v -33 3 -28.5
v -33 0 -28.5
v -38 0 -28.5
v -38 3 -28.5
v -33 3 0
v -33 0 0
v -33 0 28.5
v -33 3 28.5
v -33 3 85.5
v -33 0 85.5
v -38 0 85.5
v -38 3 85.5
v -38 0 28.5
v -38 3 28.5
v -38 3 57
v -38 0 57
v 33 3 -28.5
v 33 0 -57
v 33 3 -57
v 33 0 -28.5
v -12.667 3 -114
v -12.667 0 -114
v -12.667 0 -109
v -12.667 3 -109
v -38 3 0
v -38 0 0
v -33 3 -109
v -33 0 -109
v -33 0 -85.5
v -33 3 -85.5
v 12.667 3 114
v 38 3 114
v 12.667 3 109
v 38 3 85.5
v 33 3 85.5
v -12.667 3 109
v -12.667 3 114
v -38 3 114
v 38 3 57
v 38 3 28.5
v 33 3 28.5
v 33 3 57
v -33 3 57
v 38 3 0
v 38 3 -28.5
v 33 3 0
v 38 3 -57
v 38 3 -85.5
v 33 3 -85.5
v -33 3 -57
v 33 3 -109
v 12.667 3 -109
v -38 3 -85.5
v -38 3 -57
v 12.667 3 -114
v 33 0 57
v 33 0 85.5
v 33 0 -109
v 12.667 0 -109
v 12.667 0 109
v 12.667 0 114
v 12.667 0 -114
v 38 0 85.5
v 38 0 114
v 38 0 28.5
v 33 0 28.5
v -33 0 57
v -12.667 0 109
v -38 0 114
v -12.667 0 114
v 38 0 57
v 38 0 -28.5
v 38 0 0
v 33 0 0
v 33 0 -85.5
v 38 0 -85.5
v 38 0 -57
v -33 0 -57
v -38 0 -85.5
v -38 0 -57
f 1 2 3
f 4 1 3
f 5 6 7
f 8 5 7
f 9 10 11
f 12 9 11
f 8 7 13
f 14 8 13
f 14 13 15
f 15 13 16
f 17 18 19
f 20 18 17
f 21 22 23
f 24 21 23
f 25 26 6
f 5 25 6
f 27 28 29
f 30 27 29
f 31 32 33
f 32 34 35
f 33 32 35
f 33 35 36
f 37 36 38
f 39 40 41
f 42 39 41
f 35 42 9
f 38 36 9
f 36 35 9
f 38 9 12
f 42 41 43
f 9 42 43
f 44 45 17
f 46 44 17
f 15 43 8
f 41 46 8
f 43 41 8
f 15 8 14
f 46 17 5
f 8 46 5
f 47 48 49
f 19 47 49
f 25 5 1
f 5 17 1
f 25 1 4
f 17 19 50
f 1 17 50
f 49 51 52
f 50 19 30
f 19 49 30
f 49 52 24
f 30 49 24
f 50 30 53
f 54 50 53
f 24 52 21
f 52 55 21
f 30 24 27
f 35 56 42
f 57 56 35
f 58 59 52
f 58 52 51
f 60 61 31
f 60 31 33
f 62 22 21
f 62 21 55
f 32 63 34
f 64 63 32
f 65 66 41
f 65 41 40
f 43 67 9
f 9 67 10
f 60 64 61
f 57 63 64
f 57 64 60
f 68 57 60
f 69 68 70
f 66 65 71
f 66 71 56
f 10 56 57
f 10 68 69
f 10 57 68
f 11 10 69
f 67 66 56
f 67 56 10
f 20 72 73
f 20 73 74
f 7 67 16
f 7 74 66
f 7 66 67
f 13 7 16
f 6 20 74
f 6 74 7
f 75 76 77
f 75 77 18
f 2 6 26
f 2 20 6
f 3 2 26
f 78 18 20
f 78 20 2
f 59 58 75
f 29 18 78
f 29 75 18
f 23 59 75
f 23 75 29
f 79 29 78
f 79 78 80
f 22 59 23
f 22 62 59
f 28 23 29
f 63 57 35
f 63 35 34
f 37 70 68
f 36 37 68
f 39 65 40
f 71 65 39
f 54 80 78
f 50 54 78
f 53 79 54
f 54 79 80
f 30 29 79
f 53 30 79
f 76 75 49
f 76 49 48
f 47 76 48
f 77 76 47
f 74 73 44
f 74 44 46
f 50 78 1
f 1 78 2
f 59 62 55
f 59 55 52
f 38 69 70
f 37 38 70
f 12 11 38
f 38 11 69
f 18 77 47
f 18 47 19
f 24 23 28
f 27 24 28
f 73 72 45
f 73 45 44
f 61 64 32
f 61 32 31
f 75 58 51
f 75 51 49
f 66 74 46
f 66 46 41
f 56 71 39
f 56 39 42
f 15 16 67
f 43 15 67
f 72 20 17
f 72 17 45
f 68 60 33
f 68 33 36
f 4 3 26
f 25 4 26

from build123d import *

# Parameters (mm, degrees)
BOSS_EXTRUDE1_DEPTH = 3


with BuildPart() as part:
    # Sketch1 → Boss-Extrude1 (new body)
    with BuildSketch(Plane(origin=(0, 0, 0), x_dir=(1, 0, 0), z_dir=(0, 1, 0))):
        Polygon((-38, -114), (-12.666666667, -114), (-12.666666667, -109), (0, -109), (0, 114), (-12.666666667, 114), (-12.666666667, 109), (-33, 109), (-33, 85.5), (-38, 85.5), (-38, 57), (-33, 57), (-33, 28.5), (-38, 28.5), (-38, 0), (-33, 0), (-33, -28.5), (-38, -28.5), (-38, -57), (-33, -57), (-33, -85.5), (-38, -85.5), align=None)
    boss_extrude1 = extrude(amount=BOSS_EXTRUDE1_DEPTH)

    # Mirror1: Boss-Extrude1 across plane
    add(boss_extrude1.mirror(Plane(origin=(0, 3, 109), x_dir=(0, 0, 1), z_dir=(-1, 0, 0))))


solid = part.part
